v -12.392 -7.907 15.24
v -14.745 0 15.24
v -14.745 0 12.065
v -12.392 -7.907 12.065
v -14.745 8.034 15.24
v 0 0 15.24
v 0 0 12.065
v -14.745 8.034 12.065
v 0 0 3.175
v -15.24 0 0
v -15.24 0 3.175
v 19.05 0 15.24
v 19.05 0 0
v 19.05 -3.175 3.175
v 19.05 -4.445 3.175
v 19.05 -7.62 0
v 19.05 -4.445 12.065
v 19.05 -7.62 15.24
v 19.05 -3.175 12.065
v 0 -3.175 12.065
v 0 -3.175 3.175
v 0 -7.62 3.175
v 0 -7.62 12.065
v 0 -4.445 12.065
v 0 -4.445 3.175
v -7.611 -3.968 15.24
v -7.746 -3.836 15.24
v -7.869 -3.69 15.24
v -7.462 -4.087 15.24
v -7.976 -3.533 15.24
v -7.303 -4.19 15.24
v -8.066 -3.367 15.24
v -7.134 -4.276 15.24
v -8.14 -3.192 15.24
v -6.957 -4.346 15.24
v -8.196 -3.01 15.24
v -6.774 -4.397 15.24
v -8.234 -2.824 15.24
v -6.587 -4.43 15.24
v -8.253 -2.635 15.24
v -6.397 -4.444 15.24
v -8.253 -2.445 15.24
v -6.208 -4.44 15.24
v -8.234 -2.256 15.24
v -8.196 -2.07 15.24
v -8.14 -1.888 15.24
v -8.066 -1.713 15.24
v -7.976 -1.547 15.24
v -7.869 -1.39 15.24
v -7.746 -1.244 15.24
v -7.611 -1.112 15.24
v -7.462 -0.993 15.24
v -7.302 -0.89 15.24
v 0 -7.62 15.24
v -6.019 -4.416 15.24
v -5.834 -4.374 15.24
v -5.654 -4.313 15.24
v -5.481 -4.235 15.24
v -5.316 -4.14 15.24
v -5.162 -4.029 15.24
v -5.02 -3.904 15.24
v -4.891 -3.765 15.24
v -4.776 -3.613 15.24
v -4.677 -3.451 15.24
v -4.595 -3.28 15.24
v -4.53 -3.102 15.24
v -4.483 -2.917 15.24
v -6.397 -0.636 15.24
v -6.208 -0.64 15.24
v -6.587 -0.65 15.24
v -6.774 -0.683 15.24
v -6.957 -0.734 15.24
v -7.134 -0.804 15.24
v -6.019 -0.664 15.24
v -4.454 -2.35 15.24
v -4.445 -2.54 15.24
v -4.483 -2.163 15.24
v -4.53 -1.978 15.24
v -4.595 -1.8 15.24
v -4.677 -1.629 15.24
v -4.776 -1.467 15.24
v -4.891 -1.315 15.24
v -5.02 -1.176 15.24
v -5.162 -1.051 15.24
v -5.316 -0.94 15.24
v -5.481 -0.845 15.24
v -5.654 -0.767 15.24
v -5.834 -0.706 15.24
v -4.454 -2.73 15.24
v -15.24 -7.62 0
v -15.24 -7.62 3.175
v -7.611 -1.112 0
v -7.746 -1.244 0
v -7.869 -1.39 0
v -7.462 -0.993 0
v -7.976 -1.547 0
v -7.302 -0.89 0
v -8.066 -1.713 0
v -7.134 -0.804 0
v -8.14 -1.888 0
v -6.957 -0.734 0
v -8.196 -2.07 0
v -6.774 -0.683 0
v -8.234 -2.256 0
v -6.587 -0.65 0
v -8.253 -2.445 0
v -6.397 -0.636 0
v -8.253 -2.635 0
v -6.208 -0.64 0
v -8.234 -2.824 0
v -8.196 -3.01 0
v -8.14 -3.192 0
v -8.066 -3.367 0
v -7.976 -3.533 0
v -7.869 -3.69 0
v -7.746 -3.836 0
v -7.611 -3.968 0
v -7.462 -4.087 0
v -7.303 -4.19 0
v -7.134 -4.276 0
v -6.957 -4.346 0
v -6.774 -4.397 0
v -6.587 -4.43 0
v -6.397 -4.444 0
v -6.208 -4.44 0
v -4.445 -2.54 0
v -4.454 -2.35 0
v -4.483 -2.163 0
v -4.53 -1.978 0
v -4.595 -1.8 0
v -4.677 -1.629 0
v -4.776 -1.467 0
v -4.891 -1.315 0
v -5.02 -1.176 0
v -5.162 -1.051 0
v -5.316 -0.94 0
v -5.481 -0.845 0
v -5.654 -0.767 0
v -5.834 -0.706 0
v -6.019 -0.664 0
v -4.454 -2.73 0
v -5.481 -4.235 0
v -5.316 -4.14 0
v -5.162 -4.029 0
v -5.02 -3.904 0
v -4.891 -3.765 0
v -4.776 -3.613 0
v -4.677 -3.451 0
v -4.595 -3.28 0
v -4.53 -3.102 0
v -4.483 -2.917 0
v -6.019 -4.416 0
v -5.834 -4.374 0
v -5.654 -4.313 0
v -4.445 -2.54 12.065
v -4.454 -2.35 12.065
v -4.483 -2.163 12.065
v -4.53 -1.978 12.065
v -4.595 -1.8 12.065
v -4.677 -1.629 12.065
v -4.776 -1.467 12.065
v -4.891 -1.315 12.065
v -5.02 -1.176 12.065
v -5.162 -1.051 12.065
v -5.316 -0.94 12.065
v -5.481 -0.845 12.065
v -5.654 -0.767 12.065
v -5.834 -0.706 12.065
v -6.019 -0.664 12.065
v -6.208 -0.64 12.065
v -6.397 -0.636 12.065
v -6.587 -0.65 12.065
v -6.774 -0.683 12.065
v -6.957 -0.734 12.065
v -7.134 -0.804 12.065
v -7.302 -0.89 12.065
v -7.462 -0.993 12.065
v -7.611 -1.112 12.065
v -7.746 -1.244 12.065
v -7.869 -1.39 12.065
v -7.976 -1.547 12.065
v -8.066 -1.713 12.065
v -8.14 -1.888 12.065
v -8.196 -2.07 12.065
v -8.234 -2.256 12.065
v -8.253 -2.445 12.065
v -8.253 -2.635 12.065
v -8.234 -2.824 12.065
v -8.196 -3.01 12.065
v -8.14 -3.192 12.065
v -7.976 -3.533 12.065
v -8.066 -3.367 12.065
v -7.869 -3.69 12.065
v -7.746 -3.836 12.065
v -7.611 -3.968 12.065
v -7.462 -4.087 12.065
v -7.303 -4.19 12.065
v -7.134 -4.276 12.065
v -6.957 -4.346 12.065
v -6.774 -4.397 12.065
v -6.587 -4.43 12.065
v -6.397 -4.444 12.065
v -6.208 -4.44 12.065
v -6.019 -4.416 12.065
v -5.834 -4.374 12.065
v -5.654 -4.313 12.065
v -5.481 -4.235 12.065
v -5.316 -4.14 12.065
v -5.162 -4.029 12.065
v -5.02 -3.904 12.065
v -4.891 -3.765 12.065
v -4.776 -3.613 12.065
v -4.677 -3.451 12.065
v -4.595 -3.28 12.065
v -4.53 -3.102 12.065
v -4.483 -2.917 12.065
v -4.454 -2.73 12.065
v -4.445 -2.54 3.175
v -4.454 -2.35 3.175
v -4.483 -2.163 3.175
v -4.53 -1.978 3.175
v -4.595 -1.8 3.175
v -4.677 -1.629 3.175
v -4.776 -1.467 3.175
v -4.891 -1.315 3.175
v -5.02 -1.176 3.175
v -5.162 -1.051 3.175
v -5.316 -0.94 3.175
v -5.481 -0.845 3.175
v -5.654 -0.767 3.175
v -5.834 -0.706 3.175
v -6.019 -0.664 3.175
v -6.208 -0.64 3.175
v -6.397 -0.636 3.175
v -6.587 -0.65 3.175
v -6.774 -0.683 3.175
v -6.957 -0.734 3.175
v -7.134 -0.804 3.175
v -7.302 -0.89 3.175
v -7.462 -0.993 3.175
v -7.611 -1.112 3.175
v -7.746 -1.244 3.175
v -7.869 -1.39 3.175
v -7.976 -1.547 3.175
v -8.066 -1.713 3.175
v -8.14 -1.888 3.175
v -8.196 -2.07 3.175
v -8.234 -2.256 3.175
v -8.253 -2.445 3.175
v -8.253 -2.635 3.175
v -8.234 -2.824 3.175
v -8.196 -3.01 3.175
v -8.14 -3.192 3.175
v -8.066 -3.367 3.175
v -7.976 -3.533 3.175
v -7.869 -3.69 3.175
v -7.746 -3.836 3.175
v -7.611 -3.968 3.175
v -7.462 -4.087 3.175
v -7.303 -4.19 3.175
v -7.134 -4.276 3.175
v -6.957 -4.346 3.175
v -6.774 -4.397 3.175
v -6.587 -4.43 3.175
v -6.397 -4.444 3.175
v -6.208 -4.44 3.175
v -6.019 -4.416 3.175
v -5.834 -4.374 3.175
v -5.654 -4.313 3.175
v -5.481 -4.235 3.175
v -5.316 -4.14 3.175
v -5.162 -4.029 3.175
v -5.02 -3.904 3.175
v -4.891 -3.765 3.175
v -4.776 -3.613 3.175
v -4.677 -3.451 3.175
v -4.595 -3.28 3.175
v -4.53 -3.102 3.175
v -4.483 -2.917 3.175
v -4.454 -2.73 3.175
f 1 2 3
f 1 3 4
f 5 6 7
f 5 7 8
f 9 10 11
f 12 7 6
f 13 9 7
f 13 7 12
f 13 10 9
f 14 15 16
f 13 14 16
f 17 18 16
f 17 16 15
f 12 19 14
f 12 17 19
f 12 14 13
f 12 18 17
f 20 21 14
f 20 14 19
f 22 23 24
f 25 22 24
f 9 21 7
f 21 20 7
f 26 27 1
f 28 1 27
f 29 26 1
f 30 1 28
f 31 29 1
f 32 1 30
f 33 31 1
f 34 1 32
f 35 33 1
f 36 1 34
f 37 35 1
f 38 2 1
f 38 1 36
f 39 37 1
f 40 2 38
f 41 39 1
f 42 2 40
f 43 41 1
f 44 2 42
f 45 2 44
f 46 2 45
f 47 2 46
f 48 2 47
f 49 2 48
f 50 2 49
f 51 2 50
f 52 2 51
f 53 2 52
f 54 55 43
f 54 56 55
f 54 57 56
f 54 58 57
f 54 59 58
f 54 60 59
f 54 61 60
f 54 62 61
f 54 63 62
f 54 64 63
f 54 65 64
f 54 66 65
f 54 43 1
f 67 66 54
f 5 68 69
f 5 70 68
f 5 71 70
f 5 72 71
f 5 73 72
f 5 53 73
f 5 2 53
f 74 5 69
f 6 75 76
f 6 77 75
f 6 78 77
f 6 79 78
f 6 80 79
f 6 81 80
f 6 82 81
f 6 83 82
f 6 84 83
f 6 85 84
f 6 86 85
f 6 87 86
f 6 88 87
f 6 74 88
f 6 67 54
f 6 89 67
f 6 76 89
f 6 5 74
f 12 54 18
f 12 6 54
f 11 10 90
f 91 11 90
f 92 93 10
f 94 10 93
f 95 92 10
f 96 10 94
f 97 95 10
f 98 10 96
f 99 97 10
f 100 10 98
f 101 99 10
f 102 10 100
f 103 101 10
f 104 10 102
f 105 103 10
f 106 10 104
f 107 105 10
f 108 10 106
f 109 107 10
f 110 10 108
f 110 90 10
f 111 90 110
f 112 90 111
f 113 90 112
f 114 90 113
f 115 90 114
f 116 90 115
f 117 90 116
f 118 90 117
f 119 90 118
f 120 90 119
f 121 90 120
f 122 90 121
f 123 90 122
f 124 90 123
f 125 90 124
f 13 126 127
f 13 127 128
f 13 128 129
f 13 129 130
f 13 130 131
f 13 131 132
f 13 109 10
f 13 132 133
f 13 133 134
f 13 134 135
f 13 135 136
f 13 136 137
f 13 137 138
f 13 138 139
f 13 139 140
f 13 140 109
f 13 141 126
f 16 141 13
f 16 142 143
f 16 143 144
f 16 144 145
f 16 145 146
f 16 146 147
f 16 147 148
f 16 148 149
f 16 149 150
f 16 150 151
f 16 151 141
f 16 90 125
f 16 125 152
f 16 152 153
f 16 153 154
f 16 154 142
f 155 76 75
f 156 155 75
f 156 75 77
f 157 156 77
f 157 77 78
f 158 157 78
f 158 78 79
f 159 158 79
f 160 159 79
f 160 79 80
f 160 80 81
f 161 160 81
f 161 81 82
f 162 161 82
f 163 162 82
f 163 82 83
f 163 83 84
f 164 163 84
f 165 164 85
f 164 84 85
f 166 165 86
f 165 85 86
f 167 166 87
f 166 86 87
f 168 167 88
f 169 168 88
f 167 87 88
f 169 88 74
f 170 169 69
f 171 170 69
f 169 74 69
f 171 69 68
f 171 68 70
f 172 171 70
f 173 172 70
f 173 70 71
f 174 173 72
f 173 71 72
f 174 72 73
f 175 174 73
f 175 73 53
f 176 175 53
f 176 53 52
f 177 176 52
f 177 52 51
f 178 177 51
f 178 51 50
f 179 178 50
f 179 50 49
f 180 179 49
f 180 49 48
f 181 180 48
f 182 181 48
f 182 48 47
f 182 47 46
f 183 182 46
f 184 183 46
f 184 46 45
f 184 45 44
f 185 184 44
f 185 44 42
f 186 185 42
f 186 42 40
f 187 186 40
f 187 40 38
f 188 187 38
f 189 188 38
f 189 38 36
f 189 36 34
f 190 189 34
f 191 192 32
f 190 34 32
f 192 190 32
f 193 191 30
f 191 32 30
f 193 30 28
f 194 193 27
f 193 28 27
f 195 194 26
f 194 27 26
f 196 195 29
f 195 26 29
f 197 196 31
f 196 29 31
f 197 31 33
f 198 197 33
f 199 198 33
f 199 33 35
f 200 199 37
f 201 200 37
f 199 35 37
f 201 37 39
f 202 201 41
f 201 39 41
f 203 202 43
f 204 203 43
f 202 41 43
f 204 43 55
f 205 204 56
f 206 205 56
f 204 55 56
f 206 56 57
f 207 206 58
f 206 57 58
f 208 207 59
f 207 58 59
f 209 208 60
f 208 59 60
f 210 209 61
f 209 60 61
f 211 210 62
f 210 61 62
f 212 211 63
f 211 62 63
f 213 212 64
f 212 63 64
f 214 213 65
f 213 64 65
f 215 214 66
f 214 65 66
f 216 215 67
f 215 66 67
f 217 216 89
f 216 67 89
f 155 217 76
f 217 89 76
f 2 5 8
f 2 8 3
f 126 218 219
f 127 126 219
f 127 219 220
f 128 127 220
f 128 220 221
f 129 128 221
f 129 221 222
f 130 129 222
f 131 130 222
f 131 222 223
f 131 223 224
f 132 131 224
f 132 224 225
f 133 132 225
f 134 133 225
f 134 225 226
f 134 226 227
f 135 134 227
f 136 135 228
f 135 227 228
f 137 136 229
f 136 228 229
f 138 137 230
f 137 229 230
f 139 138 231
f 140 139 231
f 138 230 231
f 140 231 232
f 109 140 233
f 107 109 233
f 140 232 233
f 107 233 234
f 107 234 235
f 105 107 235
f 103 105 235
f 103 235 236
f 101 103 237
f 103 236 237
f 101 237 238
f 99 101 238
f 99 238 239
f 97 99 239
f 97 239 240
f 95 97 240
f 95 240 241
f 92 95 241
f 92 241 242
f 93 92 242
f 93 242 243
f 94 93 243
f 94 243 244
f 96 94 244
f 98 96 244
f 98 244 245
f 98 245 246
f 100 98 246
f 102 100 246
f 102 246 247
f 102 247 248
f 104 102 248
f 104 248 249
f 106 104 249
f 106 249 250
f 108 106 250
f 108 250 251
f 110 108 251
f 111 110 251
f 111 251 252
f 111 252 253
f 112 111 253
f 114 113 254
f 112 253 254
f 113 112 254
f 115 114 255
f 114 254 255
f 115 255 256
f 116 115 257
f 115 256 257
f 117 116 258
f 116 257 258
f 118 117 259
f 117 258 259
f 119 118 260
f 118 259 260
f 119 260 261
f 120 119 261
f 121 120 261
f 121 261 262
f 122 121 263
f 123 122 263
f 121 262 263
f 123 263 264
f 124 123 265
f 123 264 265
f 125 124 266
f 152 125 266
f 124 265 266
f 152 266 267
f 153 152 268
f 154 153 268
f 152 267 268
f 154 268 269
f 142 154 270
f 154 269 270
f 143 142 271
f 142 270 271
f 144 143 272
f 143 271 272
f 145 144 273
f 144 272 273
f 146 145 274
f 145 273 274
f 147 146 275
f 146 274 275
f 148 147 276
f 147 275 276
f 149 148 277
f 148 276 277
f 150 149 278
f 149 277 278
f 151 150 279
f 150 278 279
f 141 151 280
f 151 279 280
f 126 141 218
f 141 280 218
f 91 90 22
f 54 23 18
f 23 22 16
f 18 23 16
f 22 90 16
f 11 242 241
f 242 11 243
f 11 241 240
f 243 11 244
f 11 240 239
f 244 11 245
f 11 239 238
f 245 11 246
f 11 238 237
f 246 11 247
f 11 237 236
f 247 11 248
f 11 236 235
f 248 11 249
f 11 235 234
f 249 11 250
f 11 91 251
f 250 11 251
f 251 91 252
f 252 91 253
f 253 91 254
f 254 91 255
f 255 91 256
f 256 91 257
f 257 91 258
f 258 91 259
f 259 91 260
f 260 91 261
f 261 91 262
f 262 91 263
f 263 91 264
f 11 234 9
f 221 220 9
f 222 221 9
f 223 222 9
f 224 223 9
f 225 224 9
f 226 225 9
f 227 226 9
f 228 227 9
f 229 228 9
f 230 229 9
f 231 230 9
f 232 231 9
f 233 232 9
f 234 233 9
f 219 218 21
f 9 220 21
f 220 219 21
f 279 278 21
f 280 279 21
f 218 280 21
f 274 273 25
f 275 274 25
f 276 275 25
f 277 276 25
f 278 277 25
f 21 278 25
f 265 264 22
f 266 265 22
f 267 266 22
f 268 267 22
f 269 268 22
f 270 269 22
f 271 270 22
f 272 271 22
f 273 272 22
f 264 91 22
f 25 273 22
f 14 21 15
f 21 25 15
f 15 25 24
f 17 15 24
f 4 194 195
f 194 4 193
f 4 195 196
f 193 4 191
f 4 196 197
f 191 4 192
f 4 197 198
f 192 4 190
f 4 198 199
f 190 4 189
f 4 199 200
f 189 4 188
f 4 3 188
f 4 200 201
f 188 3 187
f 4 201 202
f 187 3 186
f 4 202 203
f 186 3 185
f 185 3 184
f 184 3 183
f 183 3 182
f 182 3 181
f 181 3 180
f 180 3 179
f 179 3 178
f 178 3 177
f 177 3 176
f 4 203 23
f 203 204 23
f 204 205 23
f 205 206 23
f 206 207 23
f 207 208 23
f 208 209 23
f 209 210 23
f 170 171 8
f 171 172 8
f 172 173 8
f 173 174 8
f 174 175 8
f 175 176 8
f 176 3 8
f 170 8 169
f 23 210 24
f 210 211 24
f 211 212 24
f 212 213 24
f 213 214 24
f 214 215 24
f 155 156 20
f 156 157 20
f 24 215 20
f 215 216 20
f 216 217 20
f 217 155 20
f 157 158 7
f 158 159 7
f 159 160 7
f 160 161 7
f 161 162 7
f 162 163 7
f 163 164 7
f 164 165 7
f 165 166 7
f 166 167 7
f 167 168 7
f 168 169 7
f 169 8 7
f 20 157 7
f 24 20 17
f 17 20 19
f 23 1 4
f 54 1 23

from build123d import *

# Parameters (mm, degrees)
F0_W     = 7.62
F0_H     = 15.24
F1_DEPTH = 19.05
F2_T     = -3.175
F4_DEPTH = 3.175
F5_W     = 15.24
F5_H     = 7.62
F6_DEPTH = 3.175
F7_R     = 1.905
F8_DEPTH = 15.241


with BuildPart() as f1:
    # F0 (on Right) → F1 (new body)
    with BuildSketch(Plane.YZ):
        with Locations((-3.81, 7.62)):
            Rectangle(F0_W, F0_H)
    extrude(amount=F1_DEPTH)

    # F2
    f2_openings = [f1.faces().sort_by_distance(p)[0] for p in [
        (0, -3.81, 7.62),
        (19.05, -3.81, 7.62),
    ]]
    offset(amount=F2_T, openings=f2_openings)

    # F3 (on face) → F4 (join, through all)
    with BuildSketch(Plane.XY.offset(15.24)):
        Polygon((-12.3918876052, -7.9068467021), (0, -7.62), (0, 0), (-14.744957909, 8.033762686), (-14.744957909, 0), align=None)
    extrude(amount=-F4_DEPTH)

    # F5 (on face) → F6 (join, through all)
    with BuildSketch(Plane(origin=(0, 0, 0), x_dir=(1, 0, 0), z_dir=(0, 0, -1))):
        with Locations((-7.62, 3.81)):
            Rectangle(F5_W, F5_H)
    extrude(amount=-F6_DEPTH)

    # F7 (on face) → F8 (cut, through all)
    with BuildSketch(Plane.XY.offset(15.24)):
        with Locations((-6.35, -2.54)):
            Circle(F7_R)
    extrude(amount=-F8_DEPTH, mode=Mode.SUBTRACT)


solid = f1.part
